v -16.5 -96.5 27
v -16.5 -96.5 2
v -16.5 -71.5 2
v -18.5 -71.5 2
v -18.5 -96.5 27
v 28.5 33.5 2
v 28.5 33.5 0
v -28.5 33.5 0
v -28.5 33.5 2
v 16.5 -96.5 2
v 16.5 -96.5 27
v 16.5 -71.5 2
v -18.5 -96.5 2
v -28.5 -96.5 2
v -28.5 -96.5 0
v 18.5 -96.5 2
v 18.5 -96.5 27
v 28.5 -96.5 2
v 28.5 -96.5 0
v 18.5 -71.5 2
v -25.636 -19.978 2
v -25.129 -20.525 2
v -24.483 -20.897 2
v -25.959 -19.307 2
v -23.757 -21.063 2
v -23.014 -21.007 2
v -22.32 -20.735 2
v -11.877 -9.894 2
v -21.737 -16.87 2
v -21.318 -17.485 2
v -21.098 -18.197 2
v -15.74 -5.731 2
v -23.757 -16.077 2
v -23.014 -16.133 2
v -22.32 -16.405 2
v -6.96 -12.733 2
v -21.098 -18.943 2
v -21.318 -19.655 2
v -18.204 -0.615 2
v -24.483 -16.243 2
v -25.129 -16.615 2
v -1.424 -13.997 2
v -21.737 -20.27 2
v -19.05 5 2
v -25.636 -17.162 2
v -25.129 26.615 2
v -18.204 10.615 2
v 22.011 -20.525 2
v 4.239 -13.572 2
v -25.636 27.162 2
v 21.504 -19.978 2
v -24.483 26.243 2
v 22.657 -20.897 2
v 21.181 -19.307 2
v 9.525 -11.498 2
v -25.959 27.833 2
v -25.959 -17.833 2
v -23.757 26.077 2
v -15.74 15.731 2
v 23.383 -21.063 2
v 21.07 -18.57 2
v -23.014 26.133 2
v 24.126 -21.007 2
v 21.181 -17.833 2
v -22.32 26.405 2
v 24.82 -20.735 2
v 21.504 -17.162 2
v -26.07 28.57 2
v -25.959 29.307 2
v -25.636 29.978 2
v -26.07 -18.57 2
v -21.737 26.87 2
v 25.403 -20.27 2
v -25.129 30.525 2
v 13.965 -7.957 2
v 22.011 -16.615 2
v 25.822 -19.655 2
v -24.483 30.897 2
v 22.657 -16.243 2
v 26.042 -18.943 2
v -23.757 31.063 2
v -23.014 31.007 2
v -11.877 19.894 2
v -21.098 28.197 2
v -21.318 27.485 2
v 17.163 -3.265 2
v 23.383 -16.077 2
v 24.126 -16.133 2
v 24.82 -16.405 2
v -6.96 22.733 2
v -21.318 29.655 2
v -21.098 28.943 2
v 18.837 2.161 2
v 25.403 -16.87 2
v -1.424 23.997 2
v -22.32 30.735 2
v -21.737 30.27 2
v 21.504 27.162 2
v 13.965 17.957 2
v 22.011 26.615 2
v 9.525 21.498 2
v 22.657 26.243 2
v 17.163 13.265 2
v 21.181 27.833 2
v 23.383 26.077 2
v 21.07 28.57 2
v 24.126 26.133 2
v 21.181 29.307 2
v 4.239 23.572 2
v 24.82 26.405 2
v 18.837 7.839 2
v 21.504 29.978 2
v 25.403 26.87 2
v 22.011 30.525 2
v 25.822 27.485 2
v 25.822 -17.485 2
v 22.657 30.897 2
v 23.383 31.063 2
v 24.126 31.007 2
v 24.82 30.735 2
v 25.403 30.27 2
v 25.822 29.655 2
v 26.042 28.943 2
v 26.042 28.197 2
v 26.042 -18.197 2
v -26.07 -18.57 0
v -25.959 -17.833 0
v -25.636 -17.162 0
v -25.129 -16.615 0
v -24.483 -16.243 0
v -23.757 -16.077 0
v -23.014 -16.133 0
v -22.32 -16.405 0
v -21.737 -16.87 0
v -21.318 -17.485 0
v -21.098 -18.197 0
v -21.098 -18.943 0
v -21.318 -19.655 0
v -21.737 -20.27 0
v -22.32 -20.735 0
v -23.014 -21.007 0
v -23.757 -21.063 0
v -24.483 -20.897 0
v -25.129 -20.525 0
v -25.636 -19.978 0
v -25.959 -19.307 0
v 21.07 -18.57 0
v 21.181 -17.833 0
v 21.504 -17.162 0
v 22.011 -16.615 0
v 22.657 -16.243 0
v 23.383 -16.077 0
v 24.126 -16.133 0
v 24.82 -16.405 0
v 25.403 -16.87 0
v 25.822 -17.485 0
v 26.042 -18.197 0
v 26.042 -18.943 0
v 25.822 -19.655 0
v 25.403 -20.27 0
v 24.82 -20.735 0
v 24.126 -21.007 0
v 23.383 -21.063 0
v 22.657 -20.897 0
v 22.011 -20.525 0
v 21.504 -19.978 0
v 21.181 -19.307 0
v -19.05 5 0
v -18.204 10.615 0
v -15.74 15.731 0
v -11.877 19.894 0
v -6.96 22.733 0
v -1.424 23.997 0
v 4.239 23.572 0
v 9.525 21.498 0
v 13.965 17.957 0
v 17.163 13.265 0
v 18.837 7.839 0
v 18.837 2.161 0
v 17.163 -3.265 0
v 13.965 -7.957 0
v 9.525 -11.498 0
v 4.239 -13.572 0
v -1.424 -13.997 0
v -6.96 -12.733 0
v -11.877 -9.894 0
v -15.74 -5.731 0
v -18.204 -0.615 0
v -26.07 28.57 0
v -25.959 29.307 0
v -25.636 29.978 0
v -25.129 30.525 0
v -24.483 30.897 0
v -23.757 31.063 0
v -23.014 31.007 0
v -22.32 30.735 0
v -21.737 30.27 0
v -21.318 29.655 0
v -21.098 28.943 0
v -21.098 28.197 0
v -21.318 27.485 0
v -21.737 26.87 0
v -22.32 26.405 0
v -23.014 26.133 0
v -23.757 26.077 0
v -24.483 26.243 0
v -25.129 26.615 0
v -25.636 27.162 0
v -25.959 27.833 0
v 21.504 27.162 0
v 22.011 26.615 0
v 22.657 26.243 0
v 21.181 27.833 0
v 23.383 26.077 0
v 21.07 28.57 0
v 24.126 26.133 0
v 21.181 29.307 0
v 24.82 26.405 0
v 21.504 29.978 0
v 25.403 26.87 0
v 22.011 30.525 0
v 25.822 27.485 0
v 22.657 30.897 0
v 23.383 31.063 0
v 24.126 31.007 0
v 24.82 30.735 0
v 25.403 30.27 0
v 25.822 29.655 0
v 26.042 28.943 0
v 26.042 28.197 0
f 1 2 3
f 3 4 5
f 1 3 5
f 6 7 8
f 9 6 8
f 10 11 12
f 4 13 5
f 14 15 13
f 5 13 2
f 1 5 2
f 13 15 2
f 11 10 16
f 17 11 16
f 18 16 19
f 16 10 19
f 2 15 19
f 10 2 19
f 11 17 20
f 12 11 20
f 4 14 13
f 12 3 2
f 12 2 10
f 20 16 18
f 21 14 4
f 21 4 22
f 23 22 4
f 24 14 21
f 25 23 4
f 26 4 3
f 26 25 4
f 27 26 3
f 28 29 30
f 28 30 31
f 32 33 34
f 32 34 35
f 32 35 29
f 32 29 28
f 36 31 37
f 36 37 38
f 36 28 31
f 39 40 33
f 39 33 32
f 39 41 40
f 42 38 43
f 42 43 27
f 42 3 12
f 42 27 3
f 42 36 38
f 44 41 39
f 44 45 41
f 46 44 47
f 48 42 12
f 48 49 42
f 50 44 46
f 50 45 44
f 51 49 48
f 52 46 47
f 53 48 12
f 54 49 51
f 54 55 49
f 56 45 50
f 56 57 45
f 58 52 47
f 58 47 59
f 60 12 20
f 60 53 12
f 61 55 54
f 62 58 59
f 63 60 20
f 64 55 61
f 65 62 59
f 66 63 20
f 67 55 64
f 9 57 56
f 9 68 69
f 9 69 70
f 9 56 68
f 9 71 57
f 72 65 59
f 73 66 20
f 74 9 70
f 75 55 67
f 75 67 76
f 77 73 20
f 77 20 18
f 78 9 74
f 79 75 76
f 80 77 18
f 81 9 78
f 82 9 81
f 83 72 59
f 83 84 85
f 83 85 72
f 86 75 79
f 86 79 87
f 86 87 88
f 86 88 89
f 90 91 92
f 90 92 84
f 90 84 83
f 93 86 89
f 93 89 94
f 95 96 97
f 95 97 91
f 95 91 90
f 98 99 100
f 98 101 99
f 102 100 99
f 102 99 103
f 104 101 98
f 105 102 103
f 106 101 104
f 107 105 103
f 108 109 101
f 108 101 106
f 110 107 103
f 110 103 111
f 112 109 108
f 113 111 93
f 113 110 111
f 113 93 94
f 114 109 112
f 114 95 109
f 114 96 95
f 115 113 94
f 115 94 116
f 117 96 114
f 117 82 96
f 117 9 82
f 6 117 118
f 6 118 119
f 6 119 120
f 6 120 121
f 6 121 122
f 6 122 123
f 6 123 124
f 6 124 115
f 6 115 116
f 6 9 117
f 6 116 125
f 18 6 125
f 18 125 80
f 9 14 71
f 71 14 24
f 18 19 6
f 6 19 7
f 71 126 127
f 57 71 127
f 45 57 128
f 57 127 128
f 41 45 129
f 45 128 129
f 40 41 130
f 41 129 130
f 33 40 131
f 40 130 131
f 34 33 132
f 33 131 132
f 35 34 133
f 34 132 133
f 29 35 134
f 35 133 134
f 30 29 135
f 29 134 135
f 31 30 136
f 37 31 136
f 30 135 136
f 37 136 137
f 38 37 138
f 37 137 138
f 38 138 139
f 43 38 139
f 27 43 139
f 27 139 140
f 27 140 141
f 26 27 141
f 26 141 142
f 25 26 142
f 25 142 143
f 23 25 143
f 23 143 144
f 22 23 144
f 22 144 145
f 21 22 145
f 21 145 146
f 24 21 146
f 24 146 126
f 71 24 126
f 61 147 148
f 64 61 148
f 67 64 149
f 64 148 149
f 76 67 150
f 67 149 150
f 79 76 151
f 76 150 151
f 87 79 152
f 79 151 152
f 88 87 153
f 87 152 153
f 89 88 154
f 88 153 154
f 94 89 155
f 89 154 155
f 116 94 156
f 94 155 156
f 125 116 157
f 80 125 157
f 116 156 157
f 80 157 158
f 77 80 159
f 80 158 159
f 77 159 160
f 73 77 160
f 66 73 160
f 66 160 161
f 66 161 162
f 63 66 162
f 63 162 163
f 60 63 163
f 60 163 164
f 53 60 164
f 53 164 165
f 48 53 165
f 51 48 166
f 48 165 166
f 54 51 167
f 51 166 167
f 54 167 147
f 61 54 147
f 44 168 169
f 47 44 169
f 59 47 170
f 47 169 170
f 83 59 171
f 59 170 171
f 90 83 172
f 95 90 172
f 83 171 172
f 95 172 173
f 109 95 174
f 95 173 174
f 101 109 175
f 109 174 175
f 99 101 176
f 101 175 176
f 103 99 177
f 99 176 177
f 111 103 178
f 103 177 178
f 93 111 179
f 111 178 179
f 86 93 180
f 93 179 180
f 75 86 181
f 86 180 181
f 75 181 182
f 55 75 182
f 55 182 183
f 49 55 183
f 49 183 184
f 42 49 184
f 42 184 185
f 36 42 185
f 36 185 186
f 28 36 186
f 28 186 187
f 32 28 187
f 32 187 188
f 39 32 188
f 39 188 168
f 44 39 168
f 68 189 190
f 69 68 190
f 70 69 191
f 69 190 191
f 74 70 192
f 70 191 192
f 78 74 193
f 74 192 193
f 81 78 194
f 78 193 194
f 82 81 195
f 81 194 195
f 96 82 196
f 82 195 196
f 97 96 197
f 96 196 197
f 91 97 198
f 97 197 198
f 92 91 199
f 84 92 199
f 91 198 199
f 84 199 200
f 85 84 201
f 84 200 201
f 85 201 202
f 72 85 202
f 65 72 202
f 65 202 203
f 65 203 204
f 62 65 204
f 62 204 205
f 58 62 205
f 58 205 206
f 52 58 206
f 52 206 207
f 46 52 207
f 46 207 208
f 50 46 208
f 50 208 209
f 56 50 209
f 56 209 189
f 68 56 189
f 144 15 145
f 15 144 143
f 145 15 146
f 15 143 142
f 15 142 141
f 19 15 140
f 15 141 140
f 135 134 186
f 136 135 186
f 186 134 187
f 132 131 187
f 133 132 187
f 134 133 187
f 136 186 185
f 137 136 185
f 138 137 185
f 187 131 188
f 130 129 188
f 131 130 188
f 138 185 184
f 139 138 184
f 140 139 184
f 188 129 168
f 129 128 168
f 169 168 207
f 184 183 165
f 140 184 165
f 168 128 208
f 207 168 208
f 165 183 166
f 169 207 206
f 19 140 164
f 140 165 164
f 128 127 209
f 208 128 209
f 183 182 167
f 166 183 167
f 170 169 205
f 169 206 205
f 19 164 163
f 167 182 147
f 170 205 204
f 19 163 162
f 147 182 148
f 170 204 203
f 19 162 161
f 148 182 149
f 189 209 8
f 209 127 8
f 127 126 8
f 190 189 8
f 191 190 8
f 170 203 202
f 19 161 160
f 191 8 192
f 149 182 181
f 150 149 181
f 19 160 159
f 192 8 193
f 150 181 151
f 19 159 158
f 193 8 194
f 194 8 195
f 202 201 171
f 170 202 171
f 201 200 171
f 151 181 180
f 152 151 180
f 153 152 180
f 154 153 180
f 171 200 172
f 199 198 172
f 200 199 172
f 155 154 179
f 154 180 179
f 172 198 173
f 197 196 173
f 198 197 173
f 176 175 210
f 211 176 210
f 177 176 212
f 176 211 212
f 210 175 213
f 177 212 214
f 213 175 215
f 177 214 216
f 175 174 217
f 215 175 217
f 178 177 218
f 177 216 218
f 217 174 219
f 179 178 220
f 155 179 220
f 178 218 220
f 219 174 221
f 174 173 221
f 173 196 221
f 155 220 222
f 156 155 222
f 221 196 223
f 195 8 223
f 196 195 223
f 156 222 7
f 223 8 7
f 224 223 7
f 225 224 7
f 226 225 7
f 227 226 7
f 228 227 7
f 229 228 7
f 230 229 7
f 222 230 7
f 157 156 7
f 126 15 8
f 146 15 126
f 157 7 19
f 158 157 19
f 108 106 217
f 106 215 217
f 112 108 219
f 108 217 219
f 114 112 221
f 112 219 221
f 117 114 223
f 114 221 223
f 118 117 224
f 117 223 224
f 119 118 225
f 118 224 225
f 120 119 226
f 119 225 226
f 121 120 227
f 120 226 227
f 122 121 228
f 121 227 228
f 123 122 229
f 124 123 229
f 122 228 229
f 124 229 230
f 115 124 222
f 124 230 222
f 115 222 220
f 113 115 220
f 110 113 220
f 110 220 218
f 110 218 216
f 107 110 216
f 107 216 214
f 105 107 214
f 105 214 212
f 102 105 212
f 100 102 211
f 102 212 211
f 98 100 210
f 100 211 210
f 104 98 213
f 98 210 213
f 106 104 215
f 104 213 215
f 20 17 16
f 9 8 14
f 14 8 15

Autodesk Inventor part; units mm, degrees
ref_plane "YZ Plane" through (0, 0, 0) normal (1, 0, 0) x (0, 1, 0)
ref_plane "XZ Plane" through (0, 0, 0) normal (0, 1, 0) x (-1, 0, 0)
ref_plane "XY Plane" through (0, 0, 0) normal (0, 0, 1) x (1, 0, 0)
sketch "Szkic1" plane through (0, 0, 0) normal (0, 0, 1) x (1, 0, 0)
  line L0 (-28.5, -96.5) -> (28.5, -96.5)
  line L1 (28.5, -96.5) -> (28.5, 33.5)
  line L2 (28.5, 33.5) -> (-28.5, 33.5)
  line L3 (-28.5, 33.5) -> (-28.5, -96.5)
  line L4 (-28.5, -96.5) -> (28.5, 33.5) construction
  line L5 (28.5, -96.5) -> (-28.5, 33.5) construction
  line L6 (0, -96.5) -> (0, 33.5) construction
  line L7 (-26.5, 33.5) -> (26.5, 33.5) projected
  line L8 (26.5, -23.5) -> (-26.5, -23.5) projected
  line L9 (0, -23.5) -> (0, 33.5) construction
  point P0 (0, -31.5)
  dimension "d0" = 57
  dimension "d1" = 130
extrude "Wyciągnięcie proste1" add sketch "Szkic1" along normal blind 2
sketch "Szkic2" plane through (0, 0, 0) normal (0, 0, -1) x (-1, 0, 0)
  circle A0 centre (0, 5) radius 5 projected
  circle A1 centre (0, 5) radius 19.05 projected
  point P0 (0, 0)
extrude "Wyciągnięcie proste2" cut sketch "Szkic2" against normal blind 10 contours A0 | A1
sketch "Szkic3" plane through (0, 0, 0) normal (0, 0, -1) x (-1, 0, 0)
  circle A0 centre (-23.57, -18.57) radius 2.5 projected
  circle A1 centre (23.57, -18.57) radius 2.5 projected
  circle A2 centre (23.57, 28.57) radius 2.5 projected
  circle A3 centre (-23.57, 28.57) radius 2.5 projected
  point P0 (0, 0)
extrude "Wyciągnięcie proste3" cut sketch "Szkic3" against normal blind 10
ref_plane "Płaszczyzna konstrukcyjna1" through (18.5, -96.5, 0) normal (1, 0, 0) x (0, 0, -1)
sketch "Szkic5" plane through (18.5, -96.5, 0) normal (1, 0, 0) x (0, 0, -1)
  line L0 (-2, 0) -> (-27, 0)
  line L1 (-27, 0) -> (-2, 25)
  line L2 (-2, 0) -> (-2, 25)
  point P0 (0, 66.5)
  dimension "d14" = 25
extrude "Wyciągnięcie proste5" add sketch "Szkic5" against normal blind 2
mirror "Odbicie lustrzane1" about plane through (0, 0, 0) normal (1, 0, 0) of "Wyciągnięcie proste5"
properties part number "stepper_console_large"
